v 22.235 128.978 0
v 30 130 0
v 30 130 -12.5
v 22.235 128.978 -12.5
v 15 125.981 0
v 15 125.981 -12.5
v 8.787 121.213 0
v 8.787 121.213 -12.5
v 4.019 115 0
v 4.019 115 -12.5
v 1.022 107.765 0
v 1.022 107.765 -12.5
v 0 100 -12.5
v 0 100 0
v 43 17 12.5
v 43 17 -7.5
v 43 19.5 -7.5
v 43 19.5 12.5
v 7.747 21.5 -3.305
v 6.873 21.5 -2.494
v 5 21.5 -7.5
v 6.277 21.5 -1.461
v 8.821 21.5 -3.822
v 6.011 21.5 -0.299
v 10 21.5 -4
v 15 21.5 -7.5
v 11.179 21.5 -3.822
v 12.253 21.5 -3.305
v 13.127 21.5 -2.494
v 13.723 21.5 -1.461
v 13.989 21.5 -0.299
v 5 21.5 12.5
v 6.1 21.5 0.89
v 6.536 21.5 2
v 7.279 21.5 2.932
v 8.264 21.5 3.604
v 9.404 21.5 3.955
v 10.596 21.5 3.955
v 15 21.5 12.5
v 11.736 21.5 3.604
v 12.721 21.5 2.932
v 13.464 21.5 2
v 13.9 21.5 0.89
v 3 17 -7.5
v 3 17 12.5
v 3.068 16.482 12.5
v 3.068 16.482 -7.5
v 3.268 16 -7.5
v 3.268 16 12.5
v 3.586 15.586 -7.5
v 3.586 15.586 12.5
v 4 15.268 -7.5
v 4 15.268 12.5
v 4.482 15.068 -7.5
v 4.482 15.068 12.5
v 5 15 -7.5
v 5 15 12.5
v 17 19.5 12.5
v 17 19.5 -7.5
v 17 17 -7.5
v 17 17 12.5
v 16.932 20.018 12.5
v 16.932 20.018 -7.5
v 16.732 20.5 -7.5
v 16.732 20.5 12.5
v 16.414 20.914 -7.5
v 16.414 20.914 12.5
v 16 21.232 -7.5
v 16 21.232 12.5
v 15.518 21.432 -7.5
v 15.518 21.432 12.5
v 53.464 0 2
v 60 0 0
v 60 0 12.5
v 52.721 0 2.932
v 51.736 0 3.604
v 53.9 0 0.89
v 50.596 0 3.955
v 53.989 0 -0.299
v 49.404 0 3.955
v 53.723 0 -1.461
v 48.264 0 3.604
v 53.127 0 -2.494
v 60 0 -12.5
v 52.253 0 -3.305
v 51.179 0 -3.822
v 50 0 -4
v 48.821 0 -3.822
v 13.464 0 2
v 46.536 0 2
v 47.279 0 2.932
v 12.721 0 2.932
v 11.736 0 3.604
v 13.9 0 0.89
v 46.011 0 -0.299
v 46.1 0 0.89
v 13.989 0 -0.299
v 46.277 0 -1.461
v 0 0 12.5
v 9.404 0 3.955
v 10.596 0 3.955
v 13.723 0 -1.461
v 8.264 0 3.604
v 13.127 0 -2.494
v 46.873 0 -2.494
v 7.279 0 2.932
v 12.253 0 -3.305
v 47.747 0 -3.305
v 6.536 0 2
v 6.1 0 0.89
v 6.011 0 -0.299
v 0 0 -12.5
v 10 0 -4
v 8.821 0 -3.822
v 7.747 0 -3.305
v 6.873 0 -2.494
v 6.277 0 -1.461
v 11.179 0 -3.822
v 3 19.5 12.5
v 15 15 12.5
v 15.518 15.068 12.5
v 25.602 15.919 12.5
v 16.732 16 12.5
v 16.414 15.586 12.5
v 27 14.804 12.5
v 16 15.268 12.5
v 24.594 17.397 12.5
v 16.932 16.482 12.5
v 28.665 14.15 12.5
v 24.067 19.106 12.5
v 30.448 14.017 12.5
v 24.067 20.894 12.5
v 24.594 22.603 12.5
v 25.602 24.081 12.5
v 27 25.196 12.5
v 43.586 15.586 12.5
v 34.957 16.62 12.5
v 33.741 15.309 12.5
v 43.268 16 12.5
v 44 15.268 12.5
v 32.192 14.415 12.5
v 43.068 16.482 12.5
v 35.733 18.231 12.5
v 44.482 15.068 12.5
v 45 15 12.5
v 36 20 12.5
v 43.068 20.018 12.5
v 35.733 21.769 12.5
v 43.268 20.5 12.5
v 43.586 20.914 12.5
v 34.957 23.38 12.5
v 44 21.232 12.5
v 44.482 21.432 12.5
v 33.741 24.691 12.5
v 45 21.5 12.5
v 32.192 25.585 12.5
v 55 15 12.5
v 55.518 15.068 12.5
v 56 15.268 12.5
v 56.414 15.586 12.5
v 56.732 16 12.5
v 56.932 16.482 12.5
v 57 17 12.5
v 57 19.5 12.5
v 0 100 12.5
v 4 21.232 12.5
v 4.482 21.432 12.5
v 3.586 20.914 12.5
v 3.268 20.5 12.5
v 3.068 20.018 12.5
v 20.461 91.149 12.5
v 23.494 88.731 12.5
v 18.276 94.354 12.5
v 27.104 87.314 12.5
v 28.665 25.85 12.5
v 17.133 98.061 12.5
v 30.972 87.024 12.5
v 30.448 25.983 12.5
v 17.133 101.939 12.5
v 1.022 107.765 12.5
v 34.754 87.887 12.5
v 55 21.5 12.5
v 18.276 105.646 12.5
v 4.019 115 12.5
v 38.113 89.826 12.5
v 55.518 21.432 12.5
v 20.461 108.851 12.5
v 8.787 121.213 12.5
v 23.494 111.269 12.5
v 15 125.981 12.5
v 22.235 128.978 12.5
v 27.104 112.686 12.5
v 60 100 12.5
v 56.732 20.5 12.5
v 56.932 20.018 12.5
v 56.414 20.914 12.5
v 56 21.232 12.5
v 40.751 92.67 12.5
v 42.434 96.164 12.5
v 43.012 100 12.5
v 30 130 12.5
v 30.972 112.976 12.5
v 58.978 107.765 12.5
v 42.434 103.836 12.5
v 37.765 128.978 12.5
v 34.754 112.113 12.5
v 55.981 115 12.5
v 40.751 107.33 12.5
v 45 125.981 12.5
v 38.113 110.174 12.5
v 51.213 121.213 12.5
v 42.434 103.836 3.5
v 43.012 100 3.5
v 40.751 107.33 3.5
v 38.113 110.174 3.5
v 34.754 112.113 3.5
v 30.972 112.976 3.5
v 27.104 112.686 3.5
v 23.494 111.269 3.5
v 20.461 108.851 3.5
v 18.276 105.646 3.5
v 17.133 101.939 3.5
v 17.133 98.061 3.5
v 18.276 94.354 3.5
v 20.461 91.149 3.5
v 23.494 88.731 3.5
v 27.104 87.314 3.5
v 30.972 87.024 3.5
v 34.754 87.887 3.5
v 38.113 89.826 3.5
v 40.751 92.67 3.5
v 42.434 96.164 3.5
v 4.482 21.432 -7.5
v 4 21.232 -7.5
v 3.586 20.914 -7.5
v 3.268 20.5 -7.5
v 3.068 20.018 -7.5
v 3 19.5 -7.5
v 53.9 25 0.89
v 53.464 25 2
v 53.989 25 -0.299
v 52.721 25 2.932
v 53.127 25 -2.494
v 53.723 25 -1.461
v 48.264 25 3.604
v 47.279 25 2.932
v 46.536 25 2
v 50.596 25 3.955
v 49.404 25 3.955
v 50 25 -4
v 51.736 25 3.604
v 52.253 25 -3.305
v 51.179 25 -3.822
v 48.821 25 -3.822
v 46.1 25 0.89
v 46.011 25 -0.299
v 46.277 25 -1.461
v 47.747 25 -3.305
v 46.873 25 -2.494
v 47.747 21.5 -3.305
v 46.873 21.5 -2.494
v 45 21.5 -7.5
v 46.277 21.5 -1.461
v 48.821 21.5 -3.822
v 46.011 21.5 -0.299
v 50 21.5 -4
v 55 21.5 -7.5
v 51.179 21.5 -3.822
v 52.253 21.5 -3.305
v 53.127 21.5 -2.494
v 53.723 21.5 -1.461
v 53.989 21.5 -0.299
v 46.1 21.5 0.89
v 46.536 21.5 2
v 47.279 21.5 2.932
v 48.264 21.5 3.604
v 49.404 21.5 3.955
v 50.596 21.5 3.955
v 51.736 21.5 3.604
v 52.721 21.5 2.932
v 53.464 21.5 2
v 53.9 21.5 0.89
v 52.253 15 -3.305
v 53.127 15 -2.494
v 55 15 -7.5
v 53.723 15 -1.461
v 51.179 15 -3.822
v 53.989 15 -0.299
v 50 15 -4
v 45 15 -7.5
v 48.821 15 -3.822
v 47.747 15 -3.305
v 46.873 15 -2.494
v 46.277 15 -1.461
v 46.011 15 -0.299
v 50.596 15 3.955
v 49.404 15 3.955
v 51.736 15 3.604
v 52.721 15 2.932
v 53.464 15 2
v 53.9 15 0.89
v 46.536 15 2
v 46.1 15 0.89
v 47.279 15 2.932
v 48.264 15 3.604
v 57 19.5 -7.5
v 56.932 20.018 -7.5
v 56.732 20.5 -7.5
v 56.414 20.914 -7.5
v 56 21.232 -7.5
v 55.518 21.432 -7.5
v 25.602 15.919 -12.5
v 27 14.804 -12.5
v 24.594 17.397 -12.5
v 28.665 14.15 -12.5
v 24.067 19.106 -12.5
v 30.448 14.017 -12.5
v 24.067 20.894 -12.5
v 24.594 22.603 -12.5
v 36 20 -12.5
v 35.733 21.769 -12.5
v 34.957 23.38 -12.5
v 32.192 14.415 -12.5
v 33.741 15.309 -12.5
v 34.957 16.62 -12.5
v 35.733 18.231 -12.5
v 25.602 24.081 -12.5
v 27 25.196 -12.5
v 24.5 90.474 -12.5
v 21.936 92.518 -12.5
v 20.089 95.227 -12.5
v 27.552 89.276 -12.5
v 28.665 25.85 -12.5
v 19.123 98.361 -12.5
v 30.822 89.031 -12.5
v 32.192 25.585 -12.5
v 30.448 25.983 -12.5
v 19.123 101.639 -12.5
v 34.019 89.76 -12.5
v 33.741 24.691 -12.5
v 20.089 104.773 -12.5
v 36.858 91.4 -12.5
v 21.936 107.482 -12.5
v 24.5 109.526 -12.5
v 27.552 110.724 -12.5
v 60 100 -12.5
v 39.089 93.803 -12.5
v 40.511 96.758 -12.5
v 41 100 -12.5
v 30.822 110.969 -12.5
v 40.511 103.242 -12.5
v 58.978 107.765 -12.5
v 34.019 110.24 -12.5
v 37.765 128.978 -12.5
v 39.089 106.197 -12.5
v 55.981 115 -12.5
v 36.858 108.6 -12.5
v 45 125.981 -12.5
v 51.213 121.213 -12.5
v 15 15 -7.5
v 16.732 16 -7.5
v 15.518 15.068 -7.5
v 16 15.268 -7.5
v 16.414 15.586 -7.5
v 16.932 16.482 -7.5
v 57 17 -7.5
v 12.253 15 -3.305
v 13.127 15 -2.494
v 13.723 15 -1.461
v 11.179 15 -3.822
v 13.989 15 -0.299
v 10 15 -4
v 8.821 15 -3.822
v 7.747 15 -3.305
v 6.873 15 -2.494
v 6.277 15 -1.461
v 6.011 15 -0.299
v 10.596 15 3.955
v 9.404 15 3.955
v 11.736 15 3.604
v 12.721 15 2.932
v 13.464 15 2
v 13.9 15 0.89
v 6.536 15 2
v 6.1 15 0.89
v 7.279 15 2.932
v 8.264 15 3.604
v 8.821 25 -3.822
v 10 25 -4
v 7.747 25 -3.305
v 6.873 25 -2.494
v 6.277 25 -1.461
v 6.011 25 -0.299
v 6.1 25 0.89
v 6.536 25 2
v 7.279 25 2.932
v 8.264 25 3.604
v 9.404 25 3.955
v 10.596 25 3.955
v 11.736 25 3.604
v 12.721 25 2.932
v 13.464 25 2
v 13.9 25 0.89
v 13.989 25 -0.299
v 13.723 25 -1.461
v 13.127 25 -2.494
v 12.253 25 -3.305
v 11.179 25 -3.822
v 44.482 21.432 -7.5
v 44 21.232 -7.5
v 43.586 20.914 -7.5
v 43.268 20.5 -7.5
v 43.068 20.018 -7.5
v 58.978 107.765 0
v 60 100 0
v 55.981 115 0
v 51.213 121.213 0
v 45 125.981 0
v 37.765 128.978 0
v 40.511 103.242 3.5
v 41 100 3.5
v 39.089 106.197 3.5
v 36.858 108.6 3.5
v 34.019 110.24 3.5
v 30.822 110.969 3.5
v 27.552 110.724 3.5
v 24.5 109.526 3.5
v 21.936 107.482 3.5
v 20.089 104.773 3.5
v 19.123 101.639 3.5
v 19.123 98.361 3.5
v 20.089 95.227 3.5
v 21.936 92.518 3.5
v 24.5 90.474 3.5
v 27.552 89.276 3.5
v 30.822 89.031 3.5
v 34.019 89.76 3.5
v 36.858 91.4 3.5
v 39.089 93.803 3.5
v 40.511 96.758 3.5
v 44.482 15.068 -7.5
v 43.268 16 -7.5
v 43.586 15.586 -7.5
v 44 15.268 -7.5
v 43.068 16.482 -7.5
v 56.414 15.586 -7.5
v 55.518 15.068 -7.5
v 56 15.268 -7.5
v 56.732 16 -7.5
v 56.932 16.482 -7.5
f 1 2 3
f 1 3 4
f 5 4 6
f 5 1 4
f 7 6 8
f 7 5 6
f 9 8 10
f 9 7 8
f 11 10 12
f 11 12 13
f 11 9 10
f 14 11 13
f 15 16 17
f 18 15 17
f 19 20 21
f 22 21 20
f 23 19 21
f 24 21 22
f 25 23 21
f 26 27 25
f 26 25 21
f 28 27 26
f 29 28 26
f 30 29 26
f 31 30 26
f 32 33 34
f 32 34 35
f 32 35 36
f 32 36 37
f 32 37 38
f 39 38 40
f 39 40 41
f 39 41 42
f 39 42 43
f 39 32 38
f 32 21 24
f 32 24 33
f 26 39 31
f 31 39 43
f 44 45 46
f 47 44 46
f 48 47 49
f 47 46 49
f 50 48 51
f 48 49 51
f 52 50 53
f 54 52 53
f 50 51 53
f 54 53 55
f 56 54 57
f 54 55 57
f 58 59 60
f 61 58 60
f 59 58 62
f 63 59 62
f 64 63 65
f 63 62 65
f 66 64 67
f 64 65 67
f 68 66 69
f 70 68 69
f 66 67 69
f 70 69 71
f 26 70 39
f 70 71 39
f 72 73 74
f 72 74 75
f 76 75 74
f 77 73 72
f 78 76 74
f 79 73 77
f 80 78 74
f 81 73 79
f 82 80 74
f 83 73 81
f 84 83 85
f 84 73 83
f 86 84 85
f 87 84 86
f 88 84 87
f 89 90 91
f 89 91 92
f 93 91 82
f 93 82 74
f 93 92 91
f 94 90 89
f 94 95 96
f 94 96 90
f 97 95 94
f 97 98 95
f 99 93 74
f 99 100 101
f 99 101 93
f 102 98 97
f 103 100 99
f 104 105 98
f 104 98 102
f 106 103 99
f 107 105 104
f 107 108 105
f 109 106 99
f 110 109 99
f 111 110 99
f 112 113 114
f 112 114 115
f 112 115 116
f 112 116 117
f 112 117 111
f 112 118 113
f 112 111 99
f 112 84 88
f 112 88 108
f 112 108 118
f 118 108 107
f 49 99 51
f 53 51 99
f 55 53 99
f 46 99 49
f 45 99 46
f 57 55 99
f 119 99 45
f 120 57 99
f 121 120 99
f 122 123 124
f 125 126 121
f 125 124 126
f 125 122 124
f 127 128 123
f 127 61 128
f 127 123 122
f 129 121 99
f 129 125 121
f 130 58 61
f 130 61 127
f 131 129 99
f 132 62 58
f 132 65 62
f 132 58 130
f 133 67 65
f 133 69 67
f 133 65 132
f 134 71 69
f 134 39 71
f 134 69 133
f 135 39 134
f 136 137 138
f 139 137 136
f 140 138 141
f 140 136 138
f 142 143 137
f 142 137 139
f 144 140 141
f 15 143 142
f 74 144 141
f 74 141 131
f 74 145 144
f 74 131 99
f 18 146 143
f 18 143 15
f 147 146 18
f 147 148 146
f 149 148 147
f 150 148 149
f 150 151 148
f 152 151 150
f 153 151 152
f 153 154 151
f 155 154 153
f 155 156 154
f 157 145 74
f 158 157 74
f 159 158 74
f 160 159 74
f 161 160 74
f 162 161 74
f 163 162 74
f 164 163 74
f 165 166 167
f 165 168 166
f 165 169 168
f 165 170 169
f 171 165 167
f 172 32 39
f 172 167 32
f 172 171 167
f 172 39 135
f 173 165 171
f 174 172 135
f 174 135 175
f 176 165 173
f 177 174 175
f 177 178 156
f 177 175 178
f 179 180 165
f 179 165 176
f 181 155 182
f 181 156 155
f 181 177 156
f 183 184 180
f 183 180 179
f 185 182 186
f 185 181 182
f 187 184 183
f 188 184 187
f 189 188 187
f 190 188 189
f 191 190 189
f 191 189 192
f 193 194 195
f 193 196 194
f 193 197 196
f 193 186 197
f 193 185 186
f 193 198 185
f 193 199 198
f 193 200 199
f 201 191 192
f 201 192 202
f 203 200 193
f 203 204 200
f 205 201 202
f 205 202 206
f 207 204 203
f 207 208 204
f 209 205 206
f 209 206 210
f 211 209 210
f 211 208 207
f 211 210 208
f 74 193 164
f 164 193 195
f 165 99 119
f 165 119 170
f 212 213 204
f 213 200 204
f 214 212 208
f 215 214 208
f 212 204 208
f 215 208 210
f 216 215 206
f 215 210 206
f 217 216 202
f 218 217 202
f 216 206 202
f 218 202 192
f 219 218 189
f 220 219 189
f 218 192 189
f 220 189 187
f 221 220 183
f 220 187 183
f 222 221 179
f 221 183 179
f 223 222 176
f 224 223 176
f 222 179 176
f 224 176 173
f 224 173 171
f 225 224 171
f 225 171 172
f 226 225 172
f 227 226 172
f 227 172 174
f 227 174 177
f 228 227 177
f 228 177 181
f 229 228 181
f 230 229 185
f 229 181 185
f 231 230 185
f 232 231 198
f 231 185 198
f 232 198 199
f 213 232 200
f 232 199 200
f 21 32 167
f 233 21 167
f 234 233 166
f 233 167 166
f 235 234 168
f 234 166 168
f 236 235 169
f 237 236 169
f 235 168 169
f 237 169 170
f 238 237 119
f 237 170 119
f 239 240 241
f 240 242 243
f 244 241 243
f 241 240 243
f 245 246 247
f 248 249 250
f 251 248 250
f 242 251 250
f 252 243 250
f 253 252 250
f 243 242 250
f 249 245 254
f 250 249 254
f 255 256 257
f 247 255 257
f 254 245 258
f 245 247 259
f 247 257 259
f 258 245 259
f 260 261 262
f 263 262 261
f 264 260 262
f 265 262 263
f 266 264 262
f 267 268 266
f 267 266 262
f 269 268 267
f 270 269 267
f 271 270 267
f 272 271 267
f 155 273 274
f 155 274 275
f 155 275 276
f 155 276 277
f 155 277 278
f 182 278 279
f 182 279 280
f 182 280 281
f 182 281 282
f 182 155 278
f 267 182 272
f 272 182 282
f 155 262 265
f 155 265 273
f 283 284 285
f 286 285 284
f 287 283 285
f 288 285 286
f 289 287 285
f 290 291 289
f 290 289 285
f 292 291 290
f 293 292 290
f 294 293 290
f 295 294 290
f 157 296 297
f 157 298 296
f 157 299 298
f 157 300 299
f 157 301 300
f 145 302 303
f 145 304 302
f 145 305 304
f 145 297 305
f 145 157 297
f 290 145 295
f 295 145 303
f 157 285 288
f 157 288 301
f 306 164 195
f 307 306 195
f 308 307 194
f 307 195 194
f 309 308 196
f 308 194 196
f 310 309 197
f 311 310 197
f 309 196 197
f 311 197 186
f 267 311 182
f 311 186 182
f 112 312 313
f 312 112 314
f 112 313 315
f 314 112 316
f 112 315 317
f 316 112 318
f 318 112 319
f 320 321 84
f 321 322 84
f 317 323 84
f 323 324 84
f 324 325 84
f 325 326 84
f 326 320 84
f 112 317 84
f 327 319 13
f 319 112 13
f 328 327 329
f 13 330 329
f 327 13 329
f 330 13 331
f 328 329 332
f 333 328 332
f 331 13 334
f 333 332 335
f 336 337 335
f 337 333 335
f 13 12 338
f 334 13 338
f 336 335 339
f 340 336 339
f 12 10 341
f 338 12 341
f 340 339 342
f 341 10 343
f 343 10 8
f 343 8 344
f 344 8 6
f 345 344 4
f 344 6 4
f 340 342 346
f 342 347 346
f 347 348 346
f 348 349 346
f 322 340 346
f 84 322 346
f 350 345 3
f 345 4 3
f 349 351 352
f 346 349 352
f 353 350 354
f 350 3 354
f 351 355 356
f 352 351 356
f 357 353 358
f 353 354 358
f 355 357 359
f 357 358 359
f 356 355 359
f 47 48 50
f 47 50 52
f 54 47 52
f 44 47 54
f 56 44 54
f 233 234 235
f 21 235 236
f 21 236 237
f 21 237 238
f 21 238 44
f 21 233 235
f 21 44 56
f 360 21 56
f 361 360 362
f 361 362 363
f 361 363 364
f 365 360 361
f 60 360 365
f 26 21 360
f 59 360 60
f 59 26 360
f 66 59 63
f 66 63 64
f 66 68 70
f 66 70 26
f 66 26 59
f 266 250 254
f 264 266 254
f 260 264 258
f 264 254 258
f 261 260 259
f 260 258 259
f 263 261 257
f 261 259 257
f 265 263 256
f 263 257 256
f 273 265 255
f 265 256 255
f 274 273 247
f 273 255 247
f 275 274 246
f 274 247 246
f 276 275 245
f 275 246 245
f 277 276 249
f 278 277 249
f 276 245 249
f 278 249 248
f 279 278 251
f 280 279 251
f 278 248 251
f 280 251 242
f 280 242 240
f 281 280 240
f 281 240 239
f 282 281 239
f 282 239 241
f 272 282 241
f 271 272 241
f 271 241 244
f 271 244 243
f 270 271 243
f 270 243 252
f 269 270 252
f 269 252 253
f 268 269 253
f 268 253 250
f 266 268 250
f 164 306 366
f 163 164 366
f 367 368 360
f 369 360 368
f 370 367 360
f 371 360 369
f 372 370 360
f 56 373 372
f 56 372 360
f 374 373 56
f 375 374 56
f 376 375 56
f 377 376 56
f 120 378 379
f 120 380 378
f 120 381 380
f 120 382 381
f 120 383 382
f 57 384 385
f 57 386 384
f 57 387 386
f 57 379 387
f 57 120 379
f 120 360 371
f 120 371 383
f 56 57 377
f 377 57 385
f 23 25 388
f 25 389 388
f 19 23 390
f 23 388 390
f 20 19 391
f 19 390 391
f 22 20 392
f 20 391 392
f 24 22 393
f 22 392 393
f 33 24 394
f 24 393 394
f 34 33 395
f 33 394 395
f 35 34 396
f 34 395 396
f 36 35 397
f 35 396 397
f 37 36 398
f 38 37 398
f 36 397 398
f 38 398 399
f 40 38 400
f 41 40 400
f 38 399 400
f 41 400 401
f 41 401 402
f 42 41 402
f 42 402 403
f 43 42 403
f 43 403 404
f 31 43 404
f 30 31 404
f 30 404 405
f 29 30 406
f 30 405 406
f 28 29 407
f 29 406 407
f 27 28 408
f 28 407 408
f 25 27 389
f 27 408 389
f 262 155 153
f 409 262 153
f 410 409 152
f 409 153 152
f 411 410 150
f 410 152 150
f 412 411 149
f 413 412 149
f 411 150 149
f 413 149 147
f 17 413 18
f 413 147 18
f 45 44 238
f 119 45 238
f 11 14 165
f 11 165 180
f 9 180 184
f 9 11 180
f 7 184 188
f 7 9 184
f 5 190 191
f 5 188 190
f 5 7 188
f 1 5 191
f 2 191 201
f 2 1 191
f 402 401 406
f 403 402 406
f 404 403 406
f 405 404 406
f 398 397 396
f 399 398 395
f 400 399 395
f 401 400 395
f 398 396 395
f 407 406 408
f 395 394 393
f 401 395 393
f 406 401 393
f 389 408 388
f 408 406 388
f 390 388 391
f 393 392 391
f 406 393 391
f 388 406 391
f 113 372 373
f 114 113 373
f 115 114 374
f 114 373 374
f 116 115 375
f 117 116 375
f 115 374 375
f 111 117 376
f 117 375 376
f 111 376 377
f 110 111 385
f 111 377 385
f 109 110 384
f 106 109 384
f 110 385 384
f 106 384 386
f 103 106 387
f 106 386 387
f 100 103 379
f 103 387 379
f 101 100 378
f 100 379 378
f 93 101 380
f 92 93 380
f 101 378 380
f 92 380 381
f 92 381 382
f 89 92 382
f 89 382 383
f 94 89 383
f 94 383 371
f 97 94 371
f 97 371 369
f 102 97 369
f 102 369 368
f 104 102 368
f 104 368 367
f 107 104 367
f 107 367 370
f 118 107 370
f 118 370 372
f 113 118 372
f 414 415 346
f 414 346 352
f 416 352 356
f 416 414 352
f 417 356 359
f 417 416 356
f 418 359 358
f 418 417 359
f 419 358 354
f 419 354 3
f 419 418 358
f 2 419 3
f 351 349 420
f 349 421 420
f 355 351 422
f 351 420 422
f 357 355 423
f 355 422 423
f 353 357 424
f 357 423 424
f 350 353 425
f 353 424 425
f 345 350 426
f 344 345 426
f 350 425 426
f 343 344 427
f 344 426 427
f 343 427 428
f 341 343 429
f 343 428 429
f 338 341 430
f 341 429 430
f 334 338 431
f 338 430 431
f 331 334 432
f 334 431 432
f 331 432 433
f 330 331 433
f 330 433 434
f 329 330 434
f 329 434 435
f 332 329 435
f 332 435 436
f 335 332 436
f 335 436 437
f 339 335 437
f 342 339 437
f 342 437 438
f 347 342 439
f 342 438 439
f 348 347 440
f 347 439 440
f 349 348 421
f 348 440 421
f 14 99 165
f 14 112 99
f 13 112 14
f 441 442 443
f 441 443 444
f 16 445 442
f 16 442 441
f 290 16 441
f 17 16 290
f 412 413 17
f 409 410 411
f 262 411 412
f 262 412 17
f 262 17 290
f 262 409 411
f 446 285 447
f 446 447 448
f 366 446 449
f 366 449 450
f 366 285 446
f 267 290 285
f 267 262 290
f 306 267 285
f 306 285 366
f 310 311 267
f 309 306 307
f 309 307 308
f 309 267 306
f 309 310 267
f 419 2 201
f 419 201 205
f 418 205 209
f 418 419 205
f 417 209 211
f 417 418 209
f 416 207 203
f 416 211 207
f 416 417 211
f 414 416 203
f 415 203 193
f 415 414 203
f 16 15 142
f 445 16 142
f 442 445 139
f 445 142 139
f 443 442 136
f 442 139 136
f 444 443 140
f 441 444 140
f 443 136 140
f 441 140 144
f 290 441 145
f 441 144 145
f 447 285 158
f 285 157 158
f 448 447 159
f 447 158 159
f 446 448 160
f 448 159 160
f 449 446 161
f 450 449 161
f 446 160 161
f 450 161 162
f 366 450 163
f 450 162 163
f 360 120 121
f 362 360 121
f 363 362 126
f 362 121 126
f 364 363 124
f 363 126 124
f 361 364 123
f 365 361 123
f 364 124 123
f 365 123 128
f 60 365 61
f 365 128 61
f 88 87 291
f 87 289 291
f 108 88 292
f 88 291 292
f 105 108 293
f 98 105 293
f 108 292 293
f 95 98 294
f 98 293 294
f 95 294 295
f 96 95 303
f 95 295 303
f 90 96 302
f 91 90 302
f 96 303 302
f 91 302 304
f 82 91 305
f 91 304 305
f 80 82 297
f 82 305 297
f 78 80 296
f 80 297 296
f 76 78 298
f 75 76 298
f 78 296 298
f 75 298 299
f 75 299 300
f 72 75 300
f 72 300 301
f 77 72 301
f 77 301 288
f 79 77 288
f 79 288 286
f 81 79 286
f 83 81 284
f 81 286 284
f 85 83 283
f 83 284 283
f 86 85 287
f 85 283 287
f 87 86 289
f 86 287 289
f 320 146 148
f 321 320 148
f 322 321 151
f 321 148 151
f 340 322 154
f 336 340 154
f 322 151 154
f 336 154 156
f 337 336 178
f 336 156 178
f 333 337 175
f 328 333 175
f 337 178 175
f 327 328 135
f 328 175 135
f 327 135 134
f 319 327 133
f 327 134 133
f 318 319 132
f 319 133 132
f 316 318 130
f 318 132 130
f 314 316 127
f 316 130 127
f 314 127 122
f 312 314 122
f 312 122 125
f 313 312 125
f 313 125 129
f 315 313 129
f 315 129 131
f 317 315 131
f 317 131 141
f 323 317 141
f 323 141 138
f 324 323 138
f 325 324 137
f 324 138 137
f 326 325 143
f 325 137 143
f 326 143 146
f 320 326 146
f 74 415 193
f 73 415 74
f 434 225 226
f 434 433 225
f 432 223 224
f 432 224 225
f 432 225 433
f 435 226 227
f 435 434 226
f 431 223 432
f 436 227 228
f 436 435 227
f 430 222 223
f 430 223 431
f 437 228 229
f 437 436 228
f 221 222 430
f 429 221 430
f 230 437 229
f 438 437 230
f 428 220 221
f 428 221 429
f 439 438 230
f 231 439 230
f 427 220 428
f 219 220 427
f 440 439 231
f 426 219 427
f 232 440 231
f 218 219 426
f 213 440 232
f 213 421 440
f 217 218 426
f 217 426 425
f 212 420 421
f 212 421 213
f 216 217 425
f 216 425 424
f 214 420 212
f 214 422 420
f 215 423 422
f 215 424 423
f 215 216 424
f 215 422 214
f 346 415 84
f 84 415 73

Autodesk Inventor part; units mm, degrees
ref_plane "YZ Plane" through (0, 0, 0) normal (1, 0, 0) x (0, 1, 0)
ref_plane "XZ Plane" through (0, 0, 0) normal (0, 1, 0) x (-1, 0, 0)
ref_plane "XY Plane" through (0, 0, 0) normal (0, 0, 1) x (1, 0, 0)
sketch "Boceto1" plane through (0, 0, 0) normal (0, 0, 1) x (1, 0, 0)
  point P0 (0, 0)
sketch "Boceto2" plane through (0, 0, 0) normal (0, 0, 1) x (1, 0, 0)
  line L0 (0, 0) -> (0, 100)
  line L1 (30, 130) -> (30, 130)
  line L2 (60, 100) -> (60, 0)
  line L3 (60, 0) -> (0, 0)
  arc A0 (30, 130) -> (0, 100) centre (30, 100) ccw
  arc A1 (60, 100) -> (30, 130) centre (30, 100) ccw
  point P0 (0, 130)
  point P1 (60, 130)
  dimension "d1" = 30
  dimension "d2" = 100
  dimension "d3" = 60
extrude "Extrusión1" add sketch "Boceto2" along normal mid plane 25
sketch "Boceto9" plane through (0, 0, 12.5) normal (0, -1, 0) x (1, 0, 0)
  circle A0 centre (50, -12.5) radius 4
  line L0 (60, -25) -> (0, -25) projected
  circle A1 centre (10, -12.5) radius 4
  line L1 (0, -12.5) -> (60, -12.5) construction
  line L2 (60, 0) -> (60, -25) construction
  dimension "d52" = 8
  dimension "d88" = 10
  dimension "d89" = 10
hole "Agujero4" at (10, 0, 0) at (50, 0, 0) direction (0, 1, 0) diameter 8 depth 25
thread "Rosca3" size "M8x1.25" class "6H" standard "ANSI Metric M Profile" full length
thread "Rosca4" size "M8x1.25" class "6H" standard "ANSI Metric M Profile" full length
sketch "Boceto10" plane through (0, 0, 12.5) normal (0, 0, 1) x (1, 0, 0)
  circle A0 centre (30, 100) radius 11
  circle A1 centre (30, 100) radius 13.0125
  line L0 (60, 0) -> (60, 100) projected
  line L1 (0, 100) -> (0, 0) projected
  line L2 (40, 144.843) -> (20, 144.843) projected
  dimension "d64" = 22
  dimension "d65" = 30
  dimension "d68" = 26.025
  dimension "d90" = 100
extrude "Extrusión5" cut sketch "Boceto10" against normal through all contours A0
extrude "Extrusión6" cut sketch "Boceto10" against normal blind 9
sketch "Boceto12" plane through (0, 0, 12.5) normal (0, 0, 1) x (1, 0, 0)
  line L0 (5, 21.5) -> (15, 21.5)
  line L1 (17, 19.5) -> (17, 17)
  line L2 (15, 15) -> (5, 15)
  line L3 (3, 17) -> (3, 19.5)
  line L4 (45, 21.5) -> (55, 21.5)
  line L5 (57, 19.5) -> (57, 17)
  line L6 (55, 15) -> (45, 15)
  line L7 (43, 17) -> (43, 19.5)
  line L8 (0, 0) -> (60, 0) projected
  line L9 (10, 0) -> (10, 43.0314) construction
  line L10 (54, 0) -> (46, 0) construction
  line L11 (50, 0) -> (50, 39.0292) construction
  arc A0 (5, 21.5) -> (3, 19.5) centre (5, 19.5) ccw
  arc A1 (3, 17) -> (5, 15) centre (5, 17) ccw
  arc A2 (15, 15) -> (17, 17) centre (15, 17) ccw
  arc A3 (17, 19.5) -> (15, 21.5) centre (15, 19.5) ccw
  arc A4 (45, 21.5) -> (43, 19.5) centre (45, 19.5) ccw
  arc A5 (43, 17) -> (45, 15) centre (45, 17) ccw
  arc A6 (57, 19.5) -> (55, 21.5) centre (55, 19.5) ccw
  arc A7 (55, 15) -> (57, 17) centre (55, 17) ccw
  point P0 (17, 15)
  point P1 (17, 21.5)
  point P2 (3, 15)
  point P3 (43, 21.5)
  point P4 (57, 15)
  point P5 (43, 15)
  dimension "d91" = 14
  dimension "d92" = 14
  dimension "d93" = 6.5
  dimension "d94" = 15
  dimension "d95" = 40
  dimension "d96" = 7
  dimension "d97" = 7
  dimension "d98" = 2
  dimension "d99" = 2
  dimension "d100" = 2
  dimension "d101" = 2
  dimension "d102" = 2
  dimension "d103" = 2
  dimension "d104" = 2
  dimension "d105" = 2
extrude "Extrusión7" cut sketch "Boceto12" against normal blind 20
sketch "Boceto13" plane through (0, 0, 12.5) normal (0, 0, 1) x (1, 0, 0)
  circle A0 centre (30, 20) radius 6
  line L0 (0, 0) -> (60, 0) construction
  line L1 (30, 0) -> (30, 20) construction
  dimension "d108" = 20
  dimension "d109" = 12
extrude "Extrusión8" cut sketch "Boceto13" against normal through all
equation "\"Radio_pliegue\" = Grosor"
equation "\"Anchura_desahogo_plegado\" = Grosor"
equation "\"Profundidad_desahogo_plegado\" = 0.5 * Grosor"
equation "\"Tamaño_destalonado\" = 4 * Grosor"
equation "\"Remanente_mínimo\" = 2 * Grosor"
equation "\"Radiodetransición\" = Radio_pliegue"
equation "\"Tamaño_de_radio_de_Jacobi\" = Grosor"
equation "\"TamañoSeparación\" = Grosor"
equation "\"Grosor\" = 0.5"
properties part number "soporte_riel" material "Nilón 6/6"
